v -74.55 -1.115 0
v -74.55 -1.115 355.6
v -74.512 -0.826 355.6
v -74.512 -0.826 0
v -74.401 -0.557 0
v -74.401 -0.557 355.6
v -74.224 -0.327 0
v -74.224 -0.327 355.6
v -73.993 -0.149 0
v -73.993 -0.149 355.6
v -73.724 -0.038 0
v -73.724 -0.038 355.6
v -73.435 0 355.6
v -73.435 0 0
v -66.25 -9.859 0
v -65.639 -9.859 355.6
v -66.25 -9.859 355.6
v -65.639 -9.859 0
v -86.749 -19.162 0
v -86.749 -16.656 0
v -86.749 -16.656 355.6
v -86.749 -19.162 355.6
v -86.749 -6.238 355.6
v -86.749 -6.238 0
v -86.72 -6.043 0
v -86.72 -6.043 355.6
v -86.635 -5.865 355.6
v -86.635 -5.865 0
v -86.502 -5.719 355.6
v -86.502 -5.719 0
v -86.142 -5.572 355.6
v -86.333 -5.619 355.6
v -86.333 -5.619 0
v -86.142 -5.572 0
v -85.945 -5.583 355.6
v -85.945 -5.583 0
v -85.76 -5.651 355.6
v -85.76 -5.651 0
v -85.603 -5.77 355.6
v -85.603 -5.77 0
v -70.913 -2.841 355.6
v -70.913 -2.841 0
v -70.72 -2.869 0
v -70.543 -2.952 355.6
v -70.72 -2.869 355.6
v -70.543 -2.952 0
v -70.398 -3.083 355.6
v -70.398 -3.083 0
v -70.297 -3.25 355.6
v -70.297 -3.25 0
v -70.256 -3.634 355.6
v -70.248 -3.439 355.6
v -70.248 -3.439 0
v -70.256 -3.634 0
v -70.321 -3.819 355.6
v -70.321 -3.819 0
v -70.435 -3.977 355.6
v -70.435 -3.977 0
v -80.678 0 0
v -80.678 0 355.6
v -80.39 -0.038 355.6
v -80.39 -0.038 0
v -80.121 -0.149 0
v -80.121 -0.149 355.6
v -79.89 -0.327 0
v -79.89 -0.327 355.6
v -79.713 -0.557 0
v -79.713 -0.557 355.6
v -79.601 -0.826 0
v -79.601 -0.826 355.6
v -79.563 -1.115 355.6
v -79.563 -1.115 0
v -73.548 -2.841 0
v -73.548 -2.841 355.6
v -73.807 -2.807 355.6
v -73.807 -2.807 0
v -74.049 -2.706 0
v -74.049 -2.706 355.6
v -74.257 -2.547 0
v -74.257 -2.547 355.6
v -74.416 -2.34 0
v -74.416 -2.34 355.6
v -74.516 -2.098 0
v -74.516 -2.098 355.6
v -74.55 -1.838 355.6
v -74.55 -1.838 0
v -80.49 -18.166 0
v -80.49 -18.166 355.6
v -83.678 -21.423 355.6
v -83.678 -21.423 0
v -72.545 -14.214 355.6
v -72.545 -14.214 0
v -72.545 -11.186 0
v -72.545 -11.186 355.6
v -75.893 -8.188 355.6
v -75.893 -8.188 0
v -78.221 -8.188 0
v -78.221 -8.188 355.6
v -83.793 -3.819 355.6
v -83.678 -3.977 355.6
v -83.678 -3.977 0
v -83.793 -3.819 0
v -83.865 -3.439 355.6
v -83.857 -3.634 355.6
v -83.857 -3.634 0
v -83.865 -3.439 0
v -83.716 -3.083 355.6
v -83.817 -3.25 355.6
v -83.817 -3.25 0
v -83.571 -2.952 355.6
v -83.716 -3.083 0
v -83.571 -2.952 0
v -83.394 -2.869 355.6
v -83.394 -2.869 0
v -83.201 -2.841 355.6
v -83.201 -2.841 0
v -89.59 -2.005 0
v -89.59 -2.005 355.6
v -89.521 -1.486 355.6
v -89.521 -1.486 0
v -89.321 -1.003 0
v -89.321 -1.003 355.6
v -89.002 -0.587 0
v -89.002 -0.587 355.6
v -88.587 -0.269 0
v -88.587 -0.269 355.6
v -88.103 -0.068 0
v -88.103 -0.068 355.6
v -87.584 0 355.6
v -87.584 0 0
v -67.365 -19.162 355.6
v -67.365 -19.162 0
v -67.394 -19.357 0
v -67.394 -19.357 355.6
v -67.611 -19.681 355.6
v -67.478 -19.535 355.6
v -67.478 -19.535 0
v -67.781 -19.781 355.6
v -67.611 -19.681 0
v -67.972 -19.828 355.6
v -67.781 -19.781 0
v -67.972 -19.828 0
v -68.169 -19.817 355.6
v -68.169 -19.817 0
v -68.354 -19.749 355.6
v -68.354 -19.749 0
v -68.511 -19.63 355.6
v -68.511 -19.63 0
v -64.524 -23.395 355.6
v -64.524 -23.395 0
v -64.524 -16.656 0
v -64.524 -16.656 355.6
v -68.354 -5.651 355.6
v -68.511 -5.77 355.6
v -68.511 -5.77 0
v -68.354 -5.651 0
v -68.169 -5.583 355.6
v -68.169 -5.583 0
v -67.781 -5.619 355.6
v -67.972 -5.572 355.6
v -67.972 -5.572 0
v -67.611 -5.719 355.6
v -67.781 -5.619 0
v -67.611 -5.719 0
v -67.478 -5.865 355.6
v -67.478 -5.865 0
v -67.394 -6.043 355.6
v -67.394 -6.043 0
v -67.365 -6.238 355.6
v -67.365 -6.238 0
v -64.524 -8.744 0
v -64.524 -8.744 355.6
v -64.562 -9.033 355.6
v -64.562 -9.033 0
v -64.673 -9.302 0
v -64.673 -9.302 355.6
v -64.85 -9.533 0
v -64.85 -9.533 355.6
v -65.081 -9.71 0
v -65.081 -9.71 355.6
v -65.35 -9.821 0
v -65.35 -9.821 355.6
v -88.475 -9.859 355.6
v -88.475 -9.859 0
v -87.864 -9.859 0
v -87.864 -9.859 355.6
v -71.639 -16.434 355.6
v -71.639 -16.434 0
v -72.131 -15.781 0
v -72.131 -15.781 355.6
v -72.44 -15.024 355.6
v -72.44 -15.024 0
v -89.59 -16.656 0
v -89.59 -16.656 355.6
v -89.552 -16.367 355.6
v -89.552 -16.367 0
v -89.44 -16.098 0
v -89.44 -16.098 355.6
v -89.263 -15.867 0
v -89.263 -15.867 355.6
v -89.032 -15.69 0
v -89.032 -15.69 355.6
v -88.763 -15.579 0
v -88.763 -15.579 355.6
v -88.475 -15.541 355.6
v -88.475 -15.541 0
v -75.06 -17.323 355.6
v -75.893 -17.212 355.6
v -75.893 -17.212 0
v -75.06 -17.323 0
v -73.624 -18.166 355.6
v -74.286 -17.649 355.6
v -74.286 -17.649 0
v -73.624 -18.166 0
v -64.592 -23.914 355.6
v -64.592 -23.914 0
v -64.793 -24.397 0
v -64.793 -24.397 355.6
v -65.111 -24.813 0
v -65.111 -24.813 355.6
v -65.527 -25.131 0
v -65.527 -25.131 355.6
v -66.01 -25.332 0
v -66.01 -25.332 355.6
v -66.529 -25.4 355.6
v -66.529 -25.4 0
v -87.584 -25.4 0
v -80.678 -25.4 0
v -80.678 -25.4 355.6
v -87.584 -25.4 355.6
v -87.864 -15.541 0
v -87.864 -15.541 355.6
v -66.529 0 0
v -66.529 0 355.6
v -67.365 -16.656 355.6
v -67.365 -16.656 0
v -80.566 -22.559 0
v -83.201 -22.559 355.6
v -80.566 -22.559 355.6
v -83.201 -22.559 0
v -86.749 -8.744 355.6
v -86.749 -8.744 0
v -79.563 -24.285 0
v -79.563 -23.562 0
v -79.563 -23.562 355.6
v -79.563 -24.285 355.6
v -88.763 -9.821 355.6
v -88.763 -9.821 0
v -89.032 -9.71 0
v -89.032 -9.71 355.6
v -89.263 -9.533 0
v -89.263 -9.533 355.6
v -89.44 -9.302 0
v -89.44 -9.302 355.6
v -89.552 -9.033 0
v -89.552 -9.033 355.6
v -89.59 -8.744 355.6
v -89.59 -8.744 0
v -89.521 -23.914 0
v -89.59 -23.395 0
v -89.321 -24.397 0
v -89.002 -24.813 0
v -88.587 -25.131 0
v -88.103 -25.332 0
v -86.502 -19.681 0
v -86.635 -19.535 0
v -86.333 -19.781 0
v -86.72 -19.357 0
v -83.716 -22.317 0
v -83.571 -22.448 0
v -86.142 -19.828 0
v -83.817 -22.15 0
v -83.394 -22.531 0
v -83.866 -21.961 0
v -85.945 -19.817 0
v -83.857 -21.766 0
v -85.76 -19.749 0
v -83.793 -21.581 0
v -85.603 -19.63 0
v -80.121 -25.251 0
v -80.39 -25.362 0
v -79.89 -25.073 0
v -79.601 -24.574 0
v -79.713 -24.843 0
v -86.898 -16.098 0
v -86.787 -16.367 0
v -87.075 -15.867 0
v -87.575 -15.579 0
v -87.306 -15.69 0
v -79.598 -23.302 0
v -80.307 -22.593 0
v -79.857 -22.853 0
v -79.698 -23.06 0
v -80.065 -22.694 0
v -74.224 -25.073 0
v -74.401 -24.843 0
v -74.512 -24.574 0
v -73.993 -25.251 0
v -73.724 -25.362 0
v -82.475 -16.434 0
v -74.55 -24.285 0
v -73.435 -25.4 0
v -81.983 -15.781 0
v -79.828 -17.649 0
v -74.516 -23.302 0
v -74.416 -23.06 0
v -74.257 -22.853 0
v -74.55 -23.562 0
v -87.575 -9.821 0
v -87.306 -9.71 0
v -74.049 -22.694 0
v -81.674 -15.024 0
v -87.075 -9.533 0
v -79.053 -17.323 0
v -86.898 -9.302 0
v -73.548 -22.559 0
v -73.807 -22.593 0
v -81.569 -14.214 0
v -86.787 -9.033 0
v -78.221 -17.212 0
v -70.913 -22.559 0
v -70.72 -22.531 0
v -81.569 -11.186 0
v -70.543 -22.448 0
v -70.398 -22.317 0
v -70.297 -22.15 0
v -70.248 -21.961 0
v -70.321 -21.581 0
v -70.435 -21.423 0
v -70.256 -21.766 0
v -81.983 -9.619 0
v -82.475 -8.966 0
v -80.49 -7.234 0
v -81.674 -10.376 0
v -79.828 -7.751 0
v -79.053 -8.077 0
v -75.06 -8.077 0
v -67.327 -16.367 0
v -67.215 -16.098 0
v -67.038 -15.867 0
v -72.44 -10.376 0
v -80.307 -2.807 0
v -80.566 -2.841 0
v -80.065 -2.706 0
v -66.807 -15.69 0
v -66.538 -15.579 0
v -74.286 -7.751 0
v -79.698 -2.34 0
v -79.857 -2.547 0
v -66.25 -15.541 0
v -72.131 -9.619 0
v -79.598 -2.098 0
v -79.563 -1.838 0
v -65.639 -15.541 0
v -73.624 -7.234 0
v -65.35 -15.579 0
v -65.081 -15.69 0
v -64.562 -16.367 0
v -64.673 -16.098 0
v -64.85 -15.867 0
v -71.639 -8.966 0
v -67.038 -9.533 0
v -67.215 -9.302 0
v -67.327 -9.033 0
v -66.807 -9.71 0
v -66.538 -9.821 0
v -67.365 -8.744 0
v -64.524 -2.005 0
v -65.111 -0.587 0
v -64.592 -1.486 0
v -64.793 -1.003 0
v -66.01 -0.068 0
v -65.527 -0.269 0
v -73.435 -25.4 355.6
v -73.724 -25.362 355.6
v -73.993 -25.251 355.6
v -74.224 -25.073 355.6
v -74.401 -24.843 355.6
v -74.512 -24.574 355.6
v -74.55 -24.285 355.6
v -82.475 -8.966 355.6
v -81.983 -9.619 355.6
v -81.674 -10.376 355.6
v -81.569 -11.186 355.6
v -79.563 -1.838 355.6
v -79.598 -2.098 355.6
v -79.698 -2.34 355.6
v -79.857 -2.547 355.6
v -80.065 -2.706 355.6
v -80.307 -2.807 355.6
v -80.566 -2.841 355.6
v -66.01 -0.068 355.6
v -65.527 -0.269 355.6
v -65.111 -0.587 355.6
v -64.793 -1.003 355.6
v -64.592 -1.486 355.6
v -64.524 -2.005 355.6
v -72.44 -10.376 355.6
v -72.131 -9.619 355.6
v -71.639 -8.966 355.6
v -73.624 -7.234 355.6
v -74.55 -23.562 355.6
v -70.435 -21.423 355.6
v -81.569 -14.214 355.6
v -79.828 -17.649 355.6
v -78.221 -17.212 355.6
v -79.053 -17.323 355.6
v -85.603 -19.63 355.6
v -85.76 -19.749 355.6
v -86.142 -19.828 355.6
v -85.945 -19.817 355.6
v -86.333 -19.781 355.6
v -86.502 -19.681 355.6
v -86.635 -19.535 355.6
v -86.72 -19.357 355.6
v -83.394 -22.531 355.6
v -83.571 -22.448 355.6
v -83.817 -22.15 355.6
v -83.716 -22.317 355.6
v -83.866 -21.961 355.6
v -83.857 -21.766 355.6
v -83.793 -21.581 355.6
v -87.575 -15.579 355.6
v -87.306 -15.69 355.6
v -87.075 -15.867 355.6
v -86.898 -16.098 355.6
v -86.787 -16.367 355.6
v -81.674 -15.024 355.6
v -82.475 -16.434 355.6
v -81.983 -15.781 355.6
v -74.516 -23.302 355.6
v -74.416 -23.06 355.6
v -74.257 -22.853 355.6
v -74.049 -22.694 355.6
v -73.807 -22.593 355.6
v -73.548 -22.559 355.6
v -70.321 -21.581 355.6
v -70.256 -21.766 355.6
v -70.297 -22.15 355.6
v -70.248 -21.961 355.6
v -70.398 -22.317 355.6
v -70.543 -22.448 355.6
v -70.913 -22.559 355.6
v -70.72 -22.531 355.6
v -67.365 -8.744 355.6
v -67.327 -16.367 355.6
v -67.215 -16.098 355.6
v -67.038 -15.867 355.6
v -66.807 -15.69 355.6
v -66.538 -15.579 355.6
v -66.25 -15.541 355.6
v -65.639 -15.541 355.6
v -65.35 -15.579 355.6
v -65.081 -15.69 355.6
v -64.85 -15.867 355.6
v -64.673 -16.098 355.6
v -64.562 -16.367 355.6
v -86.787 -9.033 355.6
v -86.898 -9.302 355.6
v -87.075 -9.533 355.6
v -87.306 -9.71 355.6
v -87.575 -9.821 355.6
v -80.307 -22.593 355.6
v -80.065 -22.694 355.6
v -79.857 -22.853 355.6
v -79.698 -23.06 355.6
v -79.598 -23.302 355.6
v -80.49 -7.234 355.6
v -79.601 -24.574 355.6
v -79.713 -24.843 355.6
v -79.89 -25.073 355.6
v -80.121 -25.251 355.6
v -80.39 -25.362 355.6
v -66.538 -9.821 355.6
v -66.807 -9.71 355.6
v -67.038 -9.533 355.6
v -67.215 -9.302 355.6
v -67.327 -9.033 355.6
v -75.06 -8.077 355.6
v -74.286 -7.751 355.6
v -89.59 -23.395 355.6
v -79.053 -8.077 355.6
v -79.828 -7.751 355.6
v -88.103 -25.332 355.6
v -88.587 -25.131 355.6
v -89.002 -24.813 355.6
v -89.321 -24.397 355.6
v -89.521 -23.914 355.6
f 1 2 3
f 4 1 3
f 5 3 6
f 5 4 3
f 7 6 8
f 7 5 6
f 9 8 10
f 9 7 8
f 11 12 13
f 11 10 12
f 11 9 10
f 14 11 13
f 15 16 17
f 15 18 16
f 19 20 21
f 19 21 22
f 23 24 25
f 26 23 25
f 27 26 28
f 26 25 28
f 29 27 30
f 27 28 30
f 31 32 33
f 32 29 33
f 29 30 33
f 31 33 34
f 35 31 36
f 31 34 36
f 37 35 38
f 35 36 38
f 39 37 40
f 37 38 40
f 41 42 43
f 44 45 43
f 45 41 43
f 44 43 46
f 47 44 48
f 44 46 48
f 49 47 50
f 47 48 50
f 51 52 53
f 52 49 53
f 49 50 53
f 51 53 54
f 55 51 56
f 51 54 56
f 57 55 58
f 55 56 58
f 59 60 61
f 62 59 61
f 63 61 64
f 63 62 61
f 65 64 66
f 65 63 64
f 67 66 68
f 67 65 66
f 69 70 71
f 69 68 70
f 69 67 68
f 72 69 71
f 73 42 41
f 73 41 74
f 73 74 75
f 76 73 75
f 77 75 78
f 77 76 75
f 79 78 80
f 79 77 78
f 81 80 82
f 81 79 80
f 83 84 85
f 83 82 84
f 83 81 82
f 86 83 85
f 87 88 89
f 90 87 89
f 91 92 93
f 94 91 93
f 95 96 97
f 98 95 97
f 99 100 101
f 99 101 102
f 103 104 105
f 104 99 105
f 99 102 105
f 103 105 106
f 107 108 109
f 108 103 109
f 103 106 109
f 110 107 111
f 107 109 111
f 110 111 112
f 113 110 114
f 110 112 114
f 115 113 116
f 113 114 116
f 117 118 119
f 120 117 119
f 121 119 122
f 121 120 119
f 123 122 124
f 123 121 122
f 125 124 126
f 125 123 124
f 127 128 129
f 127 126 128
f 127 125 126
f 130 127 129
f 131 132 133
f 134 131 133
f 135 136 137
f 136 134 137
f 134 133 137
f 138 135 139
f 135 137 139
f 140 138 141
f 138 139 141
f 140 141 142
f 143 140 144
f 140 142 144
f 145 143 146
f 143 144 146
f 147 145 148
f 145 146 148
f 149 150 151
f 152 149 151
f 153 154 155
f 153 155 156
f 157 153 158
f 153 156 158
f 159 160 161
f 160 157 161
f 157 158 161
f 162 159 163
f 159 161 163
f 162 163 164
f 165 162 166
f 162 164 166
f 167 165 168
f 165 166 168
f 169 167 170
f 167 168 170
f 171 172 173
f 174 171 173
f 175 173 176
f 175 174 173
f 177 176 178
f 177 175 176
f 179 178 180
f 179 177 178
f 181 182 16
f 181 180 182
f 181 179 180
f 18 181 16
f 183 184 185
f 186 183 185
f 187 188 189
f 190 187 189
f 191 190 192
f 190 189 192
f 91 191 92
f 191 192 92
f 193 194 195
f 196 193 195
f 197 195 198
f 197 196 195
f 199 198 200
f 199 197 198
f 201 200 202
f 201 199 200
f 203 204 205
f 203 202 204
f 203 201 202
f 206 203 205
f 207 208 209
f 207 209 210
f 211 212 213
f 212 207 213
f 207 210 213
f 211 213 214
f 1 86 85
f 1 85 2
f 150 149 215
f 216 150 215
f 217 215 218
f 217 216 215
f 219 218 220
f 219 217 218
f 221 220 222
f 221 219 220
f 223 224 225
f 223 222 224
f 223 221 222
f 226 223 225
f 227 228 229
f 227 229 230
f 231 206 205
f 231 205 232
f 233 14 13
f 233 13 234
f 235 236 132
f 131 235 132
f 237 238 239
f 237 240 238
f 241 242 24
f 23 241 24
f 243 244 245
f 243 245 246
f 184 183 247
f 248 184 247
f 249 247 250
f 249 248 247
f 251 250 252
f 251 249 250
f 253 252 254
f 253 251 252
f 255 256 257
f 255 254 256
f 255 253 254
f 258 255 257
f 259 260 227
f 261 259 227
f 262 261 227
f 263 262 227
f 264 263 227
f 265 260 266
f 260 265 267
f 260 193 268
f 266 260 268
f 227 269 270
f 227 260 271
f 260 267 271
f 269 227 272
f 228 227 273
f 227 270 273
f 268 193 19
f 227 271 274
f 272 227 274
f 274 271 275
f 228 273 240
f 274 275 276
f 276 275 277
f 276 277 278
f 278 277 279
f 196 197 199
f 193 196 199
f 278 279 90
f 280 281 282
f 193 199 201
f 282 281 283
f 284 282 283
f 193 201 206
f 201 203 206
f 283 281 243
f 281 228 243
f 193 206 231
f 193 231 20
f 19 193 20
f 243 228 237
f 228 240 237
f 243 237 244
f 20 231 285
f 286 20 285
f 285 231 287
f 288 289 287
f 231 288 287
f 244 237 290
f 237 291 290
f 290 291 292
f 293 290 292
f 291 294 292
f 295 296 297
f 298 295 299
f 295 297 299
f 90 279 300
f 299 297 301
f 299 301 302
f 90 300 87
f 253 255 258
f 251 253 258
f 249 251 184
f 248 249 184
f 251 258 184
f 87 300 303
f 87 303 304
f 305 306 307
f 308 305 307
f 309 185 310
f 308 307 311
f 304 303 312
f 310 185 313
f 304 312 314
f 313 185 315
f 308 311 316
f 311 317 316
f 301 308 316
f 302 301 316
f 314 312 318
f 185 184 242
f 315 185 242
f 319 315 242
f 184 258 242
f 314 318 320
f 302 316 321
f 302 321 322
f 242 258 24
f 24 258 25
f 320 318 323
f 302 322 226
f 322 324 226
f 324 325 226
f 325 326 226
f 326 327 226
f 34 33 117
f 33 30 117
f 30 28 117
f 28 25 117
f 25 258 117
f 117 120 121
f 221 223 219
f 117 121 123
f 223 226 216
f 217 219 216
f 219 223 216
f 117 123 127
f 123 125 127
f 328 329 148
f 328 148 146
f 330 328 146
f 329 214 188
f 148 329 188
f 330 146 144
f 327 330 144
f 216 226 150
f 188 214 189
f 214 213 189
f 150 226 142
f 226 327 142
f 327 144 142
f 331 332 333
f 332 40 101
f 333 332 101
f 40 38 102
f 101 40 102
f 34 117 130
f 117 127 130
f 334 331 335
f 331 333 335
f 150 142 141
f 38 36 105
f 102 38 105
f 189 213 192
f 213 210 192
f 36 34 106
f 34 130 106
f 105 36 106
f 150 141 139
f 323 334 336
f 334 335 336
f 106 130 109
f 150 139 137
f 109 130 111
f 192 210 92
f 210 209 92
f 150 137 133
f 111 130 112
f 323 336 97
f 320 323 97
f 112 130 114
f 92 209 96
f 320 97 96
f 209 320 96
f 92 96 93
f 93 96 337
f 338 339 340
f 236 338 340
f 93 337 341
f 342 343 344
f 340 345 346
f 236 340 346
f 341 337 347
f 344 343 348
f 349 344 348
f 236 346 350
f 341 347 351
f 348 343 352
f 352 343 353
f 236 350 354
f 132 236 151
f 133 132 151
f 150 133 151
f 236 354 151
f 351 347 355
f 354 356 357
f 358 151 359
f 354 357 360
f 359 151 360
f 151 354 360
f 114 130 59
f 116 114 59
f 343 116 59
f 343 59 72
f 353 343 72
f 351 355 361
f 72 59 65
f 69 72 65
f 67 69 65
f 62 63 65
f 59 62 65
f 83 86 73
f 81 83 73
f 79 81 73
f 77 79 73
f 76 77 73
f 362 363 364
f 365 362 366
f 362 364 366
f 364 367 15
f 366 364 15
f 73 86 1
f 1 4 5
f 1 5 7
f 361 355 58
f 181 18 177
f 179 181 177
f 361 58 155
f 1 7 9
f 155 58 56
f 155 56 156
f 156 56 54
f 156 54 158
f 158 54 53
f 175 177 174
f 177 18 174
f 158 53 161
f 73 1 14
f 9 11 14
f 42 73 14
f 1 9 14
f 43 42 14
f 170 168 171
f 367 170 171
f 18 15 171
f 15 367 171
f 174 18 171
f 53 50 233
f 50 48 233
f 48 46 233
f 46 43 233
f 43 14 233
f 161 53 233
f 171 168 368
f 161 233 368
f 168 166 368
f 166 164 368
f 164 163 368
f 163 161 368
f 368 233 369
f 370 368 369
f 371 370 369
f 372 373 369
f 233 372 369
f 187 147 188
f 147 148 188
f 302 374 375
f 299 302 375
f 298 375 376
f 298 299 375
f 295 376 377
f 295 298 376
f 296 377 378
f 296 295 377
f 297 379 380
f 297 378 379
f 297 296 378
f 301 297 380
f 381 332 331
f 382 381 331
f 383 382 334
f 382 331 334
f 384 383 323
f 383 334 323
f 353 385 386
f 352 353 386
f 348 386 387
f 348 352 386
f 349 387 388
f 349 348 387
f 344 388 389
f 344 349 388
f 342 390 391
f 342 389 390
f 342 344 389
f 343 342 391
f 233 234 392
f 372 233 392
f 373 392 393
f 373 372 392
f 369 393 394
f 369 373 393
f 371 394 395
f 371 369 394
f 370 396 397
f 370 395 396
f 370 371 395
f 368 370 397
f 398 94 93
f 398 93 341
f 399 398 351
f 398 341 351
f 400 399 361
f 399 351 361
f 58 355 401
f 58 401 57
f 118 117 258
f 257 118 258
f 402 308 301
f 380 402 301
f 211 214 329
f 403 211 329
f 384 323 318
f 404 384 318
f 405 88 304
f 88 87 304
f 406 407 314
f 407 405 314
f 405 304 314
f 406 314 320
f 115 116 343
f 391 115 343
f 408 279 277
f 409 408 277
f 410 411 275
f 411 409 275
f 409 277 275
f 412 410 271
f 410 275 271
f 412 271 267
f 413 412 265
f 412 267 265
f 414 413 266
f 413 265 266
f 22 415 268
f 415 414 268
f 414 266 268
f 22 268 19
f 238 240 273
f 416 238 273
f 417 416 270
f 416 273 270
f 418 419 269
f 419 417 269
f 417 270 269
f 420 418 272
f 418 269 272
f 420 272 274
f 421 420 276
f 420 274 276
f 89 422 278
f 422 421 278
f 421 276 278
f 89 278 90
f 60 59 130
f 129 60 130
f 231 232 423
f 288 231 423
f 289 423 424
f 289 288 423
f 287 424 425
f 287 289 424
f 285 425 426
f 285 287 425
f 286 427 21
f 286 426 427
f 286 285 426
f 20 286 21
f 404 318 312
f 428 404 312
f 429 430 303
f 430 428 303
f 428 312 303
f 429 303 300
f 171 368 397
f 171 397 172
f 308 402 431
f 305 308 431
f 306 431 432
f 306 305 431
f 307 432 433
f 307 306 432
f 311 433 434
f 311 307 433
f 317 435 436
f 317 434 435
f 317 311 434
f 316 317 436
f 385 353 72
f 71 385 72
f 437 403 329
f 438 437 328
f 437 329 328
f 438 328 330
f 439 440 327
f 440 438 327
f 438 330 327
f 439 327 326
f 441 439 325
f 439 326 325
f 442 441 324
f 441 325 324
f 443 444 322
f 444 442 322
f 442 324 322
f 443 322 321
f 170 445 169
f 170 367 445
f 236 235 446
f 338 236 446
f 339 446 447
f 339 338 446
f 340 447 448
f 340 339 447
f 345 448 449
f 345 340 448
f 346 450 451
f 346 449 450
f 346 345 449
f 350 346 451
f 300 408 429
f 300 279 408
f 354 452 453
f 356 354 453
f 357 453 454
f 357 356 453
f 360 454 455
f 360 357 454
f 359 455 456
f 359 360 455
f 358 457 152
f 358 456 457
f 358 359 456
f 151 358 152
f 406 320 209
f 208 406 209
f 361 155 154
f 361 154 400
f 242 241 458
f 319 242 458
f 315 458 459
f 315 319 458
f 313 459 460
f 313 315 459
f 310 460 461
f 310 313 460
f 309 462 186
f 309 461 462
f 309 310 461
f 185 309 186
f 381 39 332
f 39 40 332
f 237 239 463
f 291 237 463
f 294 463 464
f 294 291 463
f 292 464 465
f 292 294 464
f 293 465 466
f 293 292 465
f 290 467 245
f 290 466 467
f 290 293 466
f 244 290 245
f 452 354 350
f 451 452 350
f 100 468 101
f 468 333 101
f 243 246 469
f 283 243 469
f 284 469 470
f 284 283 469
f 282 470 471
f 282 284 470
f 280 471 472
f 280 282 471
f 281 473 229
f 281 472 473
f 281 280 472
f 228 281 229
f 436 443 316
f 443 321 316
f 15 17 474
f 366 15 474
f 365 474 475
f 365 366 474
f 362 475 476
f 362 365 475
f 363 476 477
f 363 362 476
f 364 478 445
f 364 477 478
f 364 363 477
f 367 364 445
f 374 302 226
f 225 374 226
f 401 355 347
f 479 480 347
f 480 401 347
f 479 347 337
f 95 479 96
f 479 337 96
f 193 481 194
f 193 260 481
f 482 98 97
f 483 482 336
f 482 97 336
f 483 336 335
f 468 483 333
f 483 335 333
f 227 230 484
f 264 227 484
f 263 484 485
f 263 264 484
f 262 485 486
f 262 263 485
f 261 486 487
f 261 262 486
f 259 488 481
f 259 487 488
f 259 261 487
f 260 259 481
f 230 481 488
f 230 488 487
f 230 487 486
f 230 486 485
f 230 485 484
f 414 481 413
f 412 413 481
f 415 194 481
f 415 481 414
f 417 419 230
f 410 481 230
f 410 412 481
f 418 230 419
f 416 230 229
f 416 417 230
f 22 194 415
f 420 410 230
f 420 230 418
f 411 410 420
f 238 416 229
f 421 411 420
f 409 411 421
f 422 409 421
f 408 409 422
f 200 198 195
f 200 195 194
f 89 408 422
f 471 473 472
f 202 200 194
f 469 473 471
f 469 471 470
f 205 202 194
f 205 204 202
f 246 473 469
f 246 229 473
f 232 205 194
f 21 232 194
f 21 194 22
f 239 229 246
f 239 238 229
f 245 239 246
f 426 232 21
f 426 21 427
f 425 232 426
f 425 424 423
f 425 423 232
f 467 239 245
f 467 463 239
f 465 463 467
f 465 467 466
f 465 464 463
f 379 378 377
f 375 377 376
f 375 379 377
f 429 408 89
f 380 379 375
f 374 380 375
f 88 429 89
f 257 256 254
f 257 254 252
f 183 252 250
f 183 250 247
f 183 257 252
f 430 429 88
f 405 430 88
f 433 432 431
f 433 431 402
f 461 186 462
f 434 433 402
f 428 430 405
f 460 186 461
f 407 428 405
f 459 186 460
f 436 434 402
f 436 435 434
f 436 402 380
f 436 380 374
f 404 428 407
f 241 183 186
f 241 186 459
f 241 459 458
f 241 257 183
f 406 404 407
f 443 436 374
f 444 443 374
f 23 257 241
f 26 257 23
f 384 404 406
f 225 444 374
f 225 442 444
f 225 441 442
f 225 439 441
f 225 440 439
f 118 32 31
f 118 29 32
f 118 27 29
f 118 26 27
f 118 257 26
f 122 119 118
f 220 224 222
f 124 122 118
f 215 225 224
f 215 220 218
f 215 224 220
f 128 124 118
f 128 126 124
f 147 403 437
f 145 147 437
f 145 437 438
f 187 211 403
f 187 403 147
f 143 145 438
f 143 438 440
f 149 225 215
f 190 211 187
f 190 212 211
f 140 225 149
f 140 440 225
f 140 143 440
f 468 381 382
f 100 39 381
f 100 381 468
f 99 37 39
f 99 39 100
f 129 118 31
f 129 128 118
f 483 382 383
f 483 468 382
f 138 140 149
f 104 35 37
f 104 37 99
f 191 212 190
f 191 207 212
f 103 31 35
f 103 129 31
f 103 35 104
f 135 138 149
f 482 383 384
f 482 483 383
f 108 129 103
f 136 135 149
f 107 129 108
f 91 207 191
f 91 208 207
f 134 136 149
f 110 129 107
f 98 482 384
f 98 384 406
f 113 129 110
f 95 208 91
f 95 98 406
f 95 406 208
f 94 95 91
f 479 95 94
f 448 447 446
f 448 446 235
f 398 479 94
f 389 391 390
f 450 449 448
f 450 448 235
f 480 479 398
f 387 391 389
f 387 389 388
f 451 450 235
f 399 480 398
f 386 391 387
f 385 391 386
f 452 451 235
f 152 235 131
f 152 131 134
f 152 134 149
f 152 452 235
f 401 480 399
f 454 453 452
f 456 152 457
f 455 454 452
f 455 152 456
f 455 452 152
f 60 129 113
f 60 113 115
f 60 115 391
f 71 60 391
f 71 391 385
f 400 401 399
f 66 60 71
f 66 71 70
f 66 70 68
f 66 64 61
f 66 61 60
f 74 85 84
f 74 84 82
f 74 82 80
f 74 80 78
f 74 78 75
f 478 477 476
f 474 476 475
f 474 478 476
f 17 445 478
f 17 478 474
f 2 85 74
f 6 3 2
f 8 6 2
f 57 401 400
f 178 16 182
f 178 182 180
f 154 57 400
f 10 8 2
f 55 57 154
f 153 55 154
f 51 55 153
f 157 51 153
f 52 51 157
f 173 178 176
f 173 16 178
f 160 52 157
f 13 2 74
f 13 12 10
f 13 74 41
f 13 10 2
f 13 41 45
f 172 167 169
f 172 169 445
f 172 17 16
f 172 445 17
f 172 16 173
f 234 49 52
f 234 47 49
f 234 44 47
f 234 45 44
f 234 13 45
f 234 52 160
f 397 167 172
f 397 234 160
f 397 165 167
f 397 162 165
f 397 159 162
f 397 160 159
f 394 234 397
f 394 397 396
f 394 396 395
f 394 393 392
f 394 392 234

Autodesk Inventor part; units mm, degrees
ref_plane "YZ Plane" through (0, 0, 0) normal (1, 0, 0) x (0, 1, 0)
ref_plane "XZ Plane" through (0, 0, 0) normal (0, 1, 0) x (-1, 0, 0)
ref_plane "XY Plane" through (0, 0, 0) normal (0, 0, 1) x (1, 0, 0)
ref_plane "Work Plane1" through (-89.5775, 0, 0) normal (0, 0, 1) x (1, 0, 0)
sketch "Sketch1" plane through (-89.5775, 0, 0) normal (0, 0, 1) x (1, 0, 0)
  arc A0 (19.1422, -3.9768) -> (18.6646, -2.8408) centre (18.6646, -3.5092) ccw
  line L0 (15.9535, -7.2342) -> (19.1422, -3.9768)
  line L1 (21.0667, -5.7702) -> (17.9387, -8.9655)
  arc A1 (22.2128, -6.2377) -> (21.0667, -5.7702) centre (21.5444, -6.2377) ccw
  line L2 (25.0536, -2.0053) -> (25.0536, -8.7443)
  line L3 (22.2128, -8.7443) -> (22.2128, -6.2377)
  line L4 (-0.0122, -2.0053) -> (-0.0122, -8.7443)
  arc A2 (3.9747, -5.7702) -> (2.8286, -6.2377) centre (3.497, -6.2377) ccw
  arc A3 (1.9931, 0) -> (-0.0122, -2.0053) centre (1.9931, -2.0053) ccw
  line L5 (8.8992, 0) -> (1.9931, 0)
  arc A4 (7.1027, -16.4345) -> (8.0089, -14.2135) centre (4.8339, -14.2135) ccw
  arc A5 (18.6646, -22.5592) -> (19.1422, -21.4232) centre (18.6646, -21.8908) ccw
  line L6 (15.9535, -18.1658) -> (19.1422, -21.4232)
  arc A6 (21.0667, -19.6298) -> (22.2128, -19.1623) centre (21.5444, -19.1623) ccw
  line L7 (21.0667, -19.6298) -> (17.9387, -16.4345)
  line L8 (22.2128, -16.6557) -> (22.2128, -19.1623)
  line L9 (25.0536, -23.3947) -> (25.0536, -16.6557)
  line L10 (16.1422, 0) -> (23.0483, 0)
  line L11 (18.6646, -2.8408) -> (16.0299, -2.8408)
  arc A7 (22.2128, -8.7443) -> (23.3277, -9.8592) centre (23.3277, -8.7443) ccw
  line L12 (23.9387, -9.8592) -> (23.3277, -9.8592)
  arc A8 (23.9387, -9.8592) -> (25.0536, -8.7443) centre (23.9387, -8.7443) ccw
  arc A9 (6.3768, -2.8408) -> (5.8991, -3.9768) centre (6.3768, -3.5092) ccw
  line L13 (3.9747, -5.7702) -> (7.1027, -8.9655)
  line L14 (9.0879, -7.2342) -> (5.8991, -3.9768)
  arc A10 (2.8286, -19.1623) -> (3.9747, -19.6298) centre (3.497, -19.1623) ccw
  line L15 (-0.0122, -23.3947) -> (-0.0122, -16.6557)
  line L16 (3.9747, -19.6298) -> (7.1027, -16.4345)
  arc A11 (5.8991, -21.4232) -> (6.3768, -22.5592) centre (6.3768, -21.8908) ccw
  line L17 (9.0879, -18.1658) -> (5.8991, -21.4232)
  line L18 (2.8286, -16.6557) -> (2.8286, -19.1623)
  arc A12 (23.0483, -25.4) -> (25.0536, -23.3947) centre (23.0483, -23.3947) ccw
  arc A13 (25.0536, -2.0053) -> (23.0483, 0) centre (23.0483, -2.0053) ccw
  arc A14 (13.6846, -8.1882) -> (15.9535, -7.2342) centre (13.6846, -5.0132) ccw
  line L19 (13.6846, -8.1882) -> (11.3567, -8.1882)
  arc A15 (9.0115, -2.8408) -> (10.0141, -1.8382) centre (9.0115, -1.8382) ccw
  arc A16 (9.0879, -7.2342) -> (11.3567, -8.1882) centre (11.3567, -5.0132) ccw
  arc A17 (17.9387, -8.9655) -> (17.0325, -11.1865) centre (20.2075, -11.1865) ccw
  line L20 (17.0325, -14.2135) -> (17.0325, -11.1865)
  line L21 (6.3768, -2.8408) -> (9.0115, -2.8408)
  line L22 (10.0141, -1.8382) -> (10.0141, -1.1149)
  arc A18 (10.0141, -1.1149) -> (8.8992, 0) centre (8.8992, -1.1149) ccw
  line L23 (2.8286, -8.7443) -> (2.8286, -6.2377)
  arc A19 (1.7137, -9.8592) -> (2.8286, -8.7443) centre (1.7137, -8.7443) ccw
  line L24 (1.1027, -9.8592) -> (1.7137, -9.8592)
  arc A20 (-0.0122, -8.7443) -> (1.1027, -9.8592) centre (1.1027, -8.7443) ccw
  line L25 (6.3768, -22.5592) -> (9.0115, -22.5592)
  arc A21 (10.0141, -23.5618) -> (9.0115, -22.5592) centre (9.0115, -23.5618) ccw
  line L26 (10.0141, -23.5618) -> (10.0141, -24.2851)
  arc A22 (8.8992, -25.4) -> (10.0141, -24.2851) centre (8.8992, -24.2851) ccw
  line L27 (8.8992, -25.4) -> (1.9931, -25.4)
  arc A23 (17.0325, -14.2135) -> (17.9387, -16.4345) centre (20.2075, -14.2135) ccw
  line L28 (23.9387, -15.5408) -> (23.3277, -15.5408)
  arc A24 (23.3277, -15.5408) -> (22.2128, -16.6557) centre (23.3277, -16.6557) ccw
  arc A25 (25.0536, -16.6557) -> (23.9387, -15.5408) centre (23.9387, -16.6557) ccw
  line L29 (16.1422, -25.4) -> (23.0483, -25.4)
  line L30 (18.6646, -22.5592) -> (16.0299, -22.5592)
  line L31 (8.0089, -11.1865) -> (8.0089, -14.2135)
  arc A26 (8.0089, -11.1865) -> (7.1027, -8.9655) centre (4.8339, -11.1865) ccw
  arc A27 (15.0273, -1.8382) -> (16.0299, -2.8408) centre (16.0299, -1.8382) ccw
  line L32 (15.0273, -1.8382) -> (15.0273, -1.1149)
  arc A28 (16.1422, 0) -> (15.0273, -1.1149) centre (16.1422, -1.1149) ccw
  arc A29 (-0.0122, -23.3947) -> (1.9931, -25.4) centre (1.9931, -23.3947) ccw
  arc A30 (11.3567, -17.2118) -> (9.0879, -18.1658) centre (11.3567, -20.3868) ccw
  line L33 (11.3567, -17.2118) -> (13.6846, -17.2118)
  arc A31 (15.9535, -18.1658) -> (13.6846, -17.2118) centre (13.6846, -20.3868) ccw
  arc A32 (16.0299, -22.5592) -> (15.0273, -23.5618) centre (16.0299, -23.5618) ccw
  line L34 (15.0273, -23.5618) -> (15.0273, -24.2851)
  arc A33 (15.0273, -24.2851) -> (16.1422, -25.4) centre (16.1422, -24.2851) ccw
  line L35 (1.1027, -15.5408) -> (1.7137, -15.5408)
  arc A34 (1.1027, -15.5408) -> (-0.0122, -16.6557) centre (1.1027, -16.6557) ccw
  arc A35 (2.8286, -16.6557) -> (1.7137, -15.5408) centre (1.7137, -16.6557) ccw
  point P0 (89.5775, 0)
  point P1 (12.5207, -12.7)
  dimension "d0" = 25.4
extrude "Extrusion1" add sketch "Sketch1" along normal blind 355.6
properties part number "extruded vertical"
